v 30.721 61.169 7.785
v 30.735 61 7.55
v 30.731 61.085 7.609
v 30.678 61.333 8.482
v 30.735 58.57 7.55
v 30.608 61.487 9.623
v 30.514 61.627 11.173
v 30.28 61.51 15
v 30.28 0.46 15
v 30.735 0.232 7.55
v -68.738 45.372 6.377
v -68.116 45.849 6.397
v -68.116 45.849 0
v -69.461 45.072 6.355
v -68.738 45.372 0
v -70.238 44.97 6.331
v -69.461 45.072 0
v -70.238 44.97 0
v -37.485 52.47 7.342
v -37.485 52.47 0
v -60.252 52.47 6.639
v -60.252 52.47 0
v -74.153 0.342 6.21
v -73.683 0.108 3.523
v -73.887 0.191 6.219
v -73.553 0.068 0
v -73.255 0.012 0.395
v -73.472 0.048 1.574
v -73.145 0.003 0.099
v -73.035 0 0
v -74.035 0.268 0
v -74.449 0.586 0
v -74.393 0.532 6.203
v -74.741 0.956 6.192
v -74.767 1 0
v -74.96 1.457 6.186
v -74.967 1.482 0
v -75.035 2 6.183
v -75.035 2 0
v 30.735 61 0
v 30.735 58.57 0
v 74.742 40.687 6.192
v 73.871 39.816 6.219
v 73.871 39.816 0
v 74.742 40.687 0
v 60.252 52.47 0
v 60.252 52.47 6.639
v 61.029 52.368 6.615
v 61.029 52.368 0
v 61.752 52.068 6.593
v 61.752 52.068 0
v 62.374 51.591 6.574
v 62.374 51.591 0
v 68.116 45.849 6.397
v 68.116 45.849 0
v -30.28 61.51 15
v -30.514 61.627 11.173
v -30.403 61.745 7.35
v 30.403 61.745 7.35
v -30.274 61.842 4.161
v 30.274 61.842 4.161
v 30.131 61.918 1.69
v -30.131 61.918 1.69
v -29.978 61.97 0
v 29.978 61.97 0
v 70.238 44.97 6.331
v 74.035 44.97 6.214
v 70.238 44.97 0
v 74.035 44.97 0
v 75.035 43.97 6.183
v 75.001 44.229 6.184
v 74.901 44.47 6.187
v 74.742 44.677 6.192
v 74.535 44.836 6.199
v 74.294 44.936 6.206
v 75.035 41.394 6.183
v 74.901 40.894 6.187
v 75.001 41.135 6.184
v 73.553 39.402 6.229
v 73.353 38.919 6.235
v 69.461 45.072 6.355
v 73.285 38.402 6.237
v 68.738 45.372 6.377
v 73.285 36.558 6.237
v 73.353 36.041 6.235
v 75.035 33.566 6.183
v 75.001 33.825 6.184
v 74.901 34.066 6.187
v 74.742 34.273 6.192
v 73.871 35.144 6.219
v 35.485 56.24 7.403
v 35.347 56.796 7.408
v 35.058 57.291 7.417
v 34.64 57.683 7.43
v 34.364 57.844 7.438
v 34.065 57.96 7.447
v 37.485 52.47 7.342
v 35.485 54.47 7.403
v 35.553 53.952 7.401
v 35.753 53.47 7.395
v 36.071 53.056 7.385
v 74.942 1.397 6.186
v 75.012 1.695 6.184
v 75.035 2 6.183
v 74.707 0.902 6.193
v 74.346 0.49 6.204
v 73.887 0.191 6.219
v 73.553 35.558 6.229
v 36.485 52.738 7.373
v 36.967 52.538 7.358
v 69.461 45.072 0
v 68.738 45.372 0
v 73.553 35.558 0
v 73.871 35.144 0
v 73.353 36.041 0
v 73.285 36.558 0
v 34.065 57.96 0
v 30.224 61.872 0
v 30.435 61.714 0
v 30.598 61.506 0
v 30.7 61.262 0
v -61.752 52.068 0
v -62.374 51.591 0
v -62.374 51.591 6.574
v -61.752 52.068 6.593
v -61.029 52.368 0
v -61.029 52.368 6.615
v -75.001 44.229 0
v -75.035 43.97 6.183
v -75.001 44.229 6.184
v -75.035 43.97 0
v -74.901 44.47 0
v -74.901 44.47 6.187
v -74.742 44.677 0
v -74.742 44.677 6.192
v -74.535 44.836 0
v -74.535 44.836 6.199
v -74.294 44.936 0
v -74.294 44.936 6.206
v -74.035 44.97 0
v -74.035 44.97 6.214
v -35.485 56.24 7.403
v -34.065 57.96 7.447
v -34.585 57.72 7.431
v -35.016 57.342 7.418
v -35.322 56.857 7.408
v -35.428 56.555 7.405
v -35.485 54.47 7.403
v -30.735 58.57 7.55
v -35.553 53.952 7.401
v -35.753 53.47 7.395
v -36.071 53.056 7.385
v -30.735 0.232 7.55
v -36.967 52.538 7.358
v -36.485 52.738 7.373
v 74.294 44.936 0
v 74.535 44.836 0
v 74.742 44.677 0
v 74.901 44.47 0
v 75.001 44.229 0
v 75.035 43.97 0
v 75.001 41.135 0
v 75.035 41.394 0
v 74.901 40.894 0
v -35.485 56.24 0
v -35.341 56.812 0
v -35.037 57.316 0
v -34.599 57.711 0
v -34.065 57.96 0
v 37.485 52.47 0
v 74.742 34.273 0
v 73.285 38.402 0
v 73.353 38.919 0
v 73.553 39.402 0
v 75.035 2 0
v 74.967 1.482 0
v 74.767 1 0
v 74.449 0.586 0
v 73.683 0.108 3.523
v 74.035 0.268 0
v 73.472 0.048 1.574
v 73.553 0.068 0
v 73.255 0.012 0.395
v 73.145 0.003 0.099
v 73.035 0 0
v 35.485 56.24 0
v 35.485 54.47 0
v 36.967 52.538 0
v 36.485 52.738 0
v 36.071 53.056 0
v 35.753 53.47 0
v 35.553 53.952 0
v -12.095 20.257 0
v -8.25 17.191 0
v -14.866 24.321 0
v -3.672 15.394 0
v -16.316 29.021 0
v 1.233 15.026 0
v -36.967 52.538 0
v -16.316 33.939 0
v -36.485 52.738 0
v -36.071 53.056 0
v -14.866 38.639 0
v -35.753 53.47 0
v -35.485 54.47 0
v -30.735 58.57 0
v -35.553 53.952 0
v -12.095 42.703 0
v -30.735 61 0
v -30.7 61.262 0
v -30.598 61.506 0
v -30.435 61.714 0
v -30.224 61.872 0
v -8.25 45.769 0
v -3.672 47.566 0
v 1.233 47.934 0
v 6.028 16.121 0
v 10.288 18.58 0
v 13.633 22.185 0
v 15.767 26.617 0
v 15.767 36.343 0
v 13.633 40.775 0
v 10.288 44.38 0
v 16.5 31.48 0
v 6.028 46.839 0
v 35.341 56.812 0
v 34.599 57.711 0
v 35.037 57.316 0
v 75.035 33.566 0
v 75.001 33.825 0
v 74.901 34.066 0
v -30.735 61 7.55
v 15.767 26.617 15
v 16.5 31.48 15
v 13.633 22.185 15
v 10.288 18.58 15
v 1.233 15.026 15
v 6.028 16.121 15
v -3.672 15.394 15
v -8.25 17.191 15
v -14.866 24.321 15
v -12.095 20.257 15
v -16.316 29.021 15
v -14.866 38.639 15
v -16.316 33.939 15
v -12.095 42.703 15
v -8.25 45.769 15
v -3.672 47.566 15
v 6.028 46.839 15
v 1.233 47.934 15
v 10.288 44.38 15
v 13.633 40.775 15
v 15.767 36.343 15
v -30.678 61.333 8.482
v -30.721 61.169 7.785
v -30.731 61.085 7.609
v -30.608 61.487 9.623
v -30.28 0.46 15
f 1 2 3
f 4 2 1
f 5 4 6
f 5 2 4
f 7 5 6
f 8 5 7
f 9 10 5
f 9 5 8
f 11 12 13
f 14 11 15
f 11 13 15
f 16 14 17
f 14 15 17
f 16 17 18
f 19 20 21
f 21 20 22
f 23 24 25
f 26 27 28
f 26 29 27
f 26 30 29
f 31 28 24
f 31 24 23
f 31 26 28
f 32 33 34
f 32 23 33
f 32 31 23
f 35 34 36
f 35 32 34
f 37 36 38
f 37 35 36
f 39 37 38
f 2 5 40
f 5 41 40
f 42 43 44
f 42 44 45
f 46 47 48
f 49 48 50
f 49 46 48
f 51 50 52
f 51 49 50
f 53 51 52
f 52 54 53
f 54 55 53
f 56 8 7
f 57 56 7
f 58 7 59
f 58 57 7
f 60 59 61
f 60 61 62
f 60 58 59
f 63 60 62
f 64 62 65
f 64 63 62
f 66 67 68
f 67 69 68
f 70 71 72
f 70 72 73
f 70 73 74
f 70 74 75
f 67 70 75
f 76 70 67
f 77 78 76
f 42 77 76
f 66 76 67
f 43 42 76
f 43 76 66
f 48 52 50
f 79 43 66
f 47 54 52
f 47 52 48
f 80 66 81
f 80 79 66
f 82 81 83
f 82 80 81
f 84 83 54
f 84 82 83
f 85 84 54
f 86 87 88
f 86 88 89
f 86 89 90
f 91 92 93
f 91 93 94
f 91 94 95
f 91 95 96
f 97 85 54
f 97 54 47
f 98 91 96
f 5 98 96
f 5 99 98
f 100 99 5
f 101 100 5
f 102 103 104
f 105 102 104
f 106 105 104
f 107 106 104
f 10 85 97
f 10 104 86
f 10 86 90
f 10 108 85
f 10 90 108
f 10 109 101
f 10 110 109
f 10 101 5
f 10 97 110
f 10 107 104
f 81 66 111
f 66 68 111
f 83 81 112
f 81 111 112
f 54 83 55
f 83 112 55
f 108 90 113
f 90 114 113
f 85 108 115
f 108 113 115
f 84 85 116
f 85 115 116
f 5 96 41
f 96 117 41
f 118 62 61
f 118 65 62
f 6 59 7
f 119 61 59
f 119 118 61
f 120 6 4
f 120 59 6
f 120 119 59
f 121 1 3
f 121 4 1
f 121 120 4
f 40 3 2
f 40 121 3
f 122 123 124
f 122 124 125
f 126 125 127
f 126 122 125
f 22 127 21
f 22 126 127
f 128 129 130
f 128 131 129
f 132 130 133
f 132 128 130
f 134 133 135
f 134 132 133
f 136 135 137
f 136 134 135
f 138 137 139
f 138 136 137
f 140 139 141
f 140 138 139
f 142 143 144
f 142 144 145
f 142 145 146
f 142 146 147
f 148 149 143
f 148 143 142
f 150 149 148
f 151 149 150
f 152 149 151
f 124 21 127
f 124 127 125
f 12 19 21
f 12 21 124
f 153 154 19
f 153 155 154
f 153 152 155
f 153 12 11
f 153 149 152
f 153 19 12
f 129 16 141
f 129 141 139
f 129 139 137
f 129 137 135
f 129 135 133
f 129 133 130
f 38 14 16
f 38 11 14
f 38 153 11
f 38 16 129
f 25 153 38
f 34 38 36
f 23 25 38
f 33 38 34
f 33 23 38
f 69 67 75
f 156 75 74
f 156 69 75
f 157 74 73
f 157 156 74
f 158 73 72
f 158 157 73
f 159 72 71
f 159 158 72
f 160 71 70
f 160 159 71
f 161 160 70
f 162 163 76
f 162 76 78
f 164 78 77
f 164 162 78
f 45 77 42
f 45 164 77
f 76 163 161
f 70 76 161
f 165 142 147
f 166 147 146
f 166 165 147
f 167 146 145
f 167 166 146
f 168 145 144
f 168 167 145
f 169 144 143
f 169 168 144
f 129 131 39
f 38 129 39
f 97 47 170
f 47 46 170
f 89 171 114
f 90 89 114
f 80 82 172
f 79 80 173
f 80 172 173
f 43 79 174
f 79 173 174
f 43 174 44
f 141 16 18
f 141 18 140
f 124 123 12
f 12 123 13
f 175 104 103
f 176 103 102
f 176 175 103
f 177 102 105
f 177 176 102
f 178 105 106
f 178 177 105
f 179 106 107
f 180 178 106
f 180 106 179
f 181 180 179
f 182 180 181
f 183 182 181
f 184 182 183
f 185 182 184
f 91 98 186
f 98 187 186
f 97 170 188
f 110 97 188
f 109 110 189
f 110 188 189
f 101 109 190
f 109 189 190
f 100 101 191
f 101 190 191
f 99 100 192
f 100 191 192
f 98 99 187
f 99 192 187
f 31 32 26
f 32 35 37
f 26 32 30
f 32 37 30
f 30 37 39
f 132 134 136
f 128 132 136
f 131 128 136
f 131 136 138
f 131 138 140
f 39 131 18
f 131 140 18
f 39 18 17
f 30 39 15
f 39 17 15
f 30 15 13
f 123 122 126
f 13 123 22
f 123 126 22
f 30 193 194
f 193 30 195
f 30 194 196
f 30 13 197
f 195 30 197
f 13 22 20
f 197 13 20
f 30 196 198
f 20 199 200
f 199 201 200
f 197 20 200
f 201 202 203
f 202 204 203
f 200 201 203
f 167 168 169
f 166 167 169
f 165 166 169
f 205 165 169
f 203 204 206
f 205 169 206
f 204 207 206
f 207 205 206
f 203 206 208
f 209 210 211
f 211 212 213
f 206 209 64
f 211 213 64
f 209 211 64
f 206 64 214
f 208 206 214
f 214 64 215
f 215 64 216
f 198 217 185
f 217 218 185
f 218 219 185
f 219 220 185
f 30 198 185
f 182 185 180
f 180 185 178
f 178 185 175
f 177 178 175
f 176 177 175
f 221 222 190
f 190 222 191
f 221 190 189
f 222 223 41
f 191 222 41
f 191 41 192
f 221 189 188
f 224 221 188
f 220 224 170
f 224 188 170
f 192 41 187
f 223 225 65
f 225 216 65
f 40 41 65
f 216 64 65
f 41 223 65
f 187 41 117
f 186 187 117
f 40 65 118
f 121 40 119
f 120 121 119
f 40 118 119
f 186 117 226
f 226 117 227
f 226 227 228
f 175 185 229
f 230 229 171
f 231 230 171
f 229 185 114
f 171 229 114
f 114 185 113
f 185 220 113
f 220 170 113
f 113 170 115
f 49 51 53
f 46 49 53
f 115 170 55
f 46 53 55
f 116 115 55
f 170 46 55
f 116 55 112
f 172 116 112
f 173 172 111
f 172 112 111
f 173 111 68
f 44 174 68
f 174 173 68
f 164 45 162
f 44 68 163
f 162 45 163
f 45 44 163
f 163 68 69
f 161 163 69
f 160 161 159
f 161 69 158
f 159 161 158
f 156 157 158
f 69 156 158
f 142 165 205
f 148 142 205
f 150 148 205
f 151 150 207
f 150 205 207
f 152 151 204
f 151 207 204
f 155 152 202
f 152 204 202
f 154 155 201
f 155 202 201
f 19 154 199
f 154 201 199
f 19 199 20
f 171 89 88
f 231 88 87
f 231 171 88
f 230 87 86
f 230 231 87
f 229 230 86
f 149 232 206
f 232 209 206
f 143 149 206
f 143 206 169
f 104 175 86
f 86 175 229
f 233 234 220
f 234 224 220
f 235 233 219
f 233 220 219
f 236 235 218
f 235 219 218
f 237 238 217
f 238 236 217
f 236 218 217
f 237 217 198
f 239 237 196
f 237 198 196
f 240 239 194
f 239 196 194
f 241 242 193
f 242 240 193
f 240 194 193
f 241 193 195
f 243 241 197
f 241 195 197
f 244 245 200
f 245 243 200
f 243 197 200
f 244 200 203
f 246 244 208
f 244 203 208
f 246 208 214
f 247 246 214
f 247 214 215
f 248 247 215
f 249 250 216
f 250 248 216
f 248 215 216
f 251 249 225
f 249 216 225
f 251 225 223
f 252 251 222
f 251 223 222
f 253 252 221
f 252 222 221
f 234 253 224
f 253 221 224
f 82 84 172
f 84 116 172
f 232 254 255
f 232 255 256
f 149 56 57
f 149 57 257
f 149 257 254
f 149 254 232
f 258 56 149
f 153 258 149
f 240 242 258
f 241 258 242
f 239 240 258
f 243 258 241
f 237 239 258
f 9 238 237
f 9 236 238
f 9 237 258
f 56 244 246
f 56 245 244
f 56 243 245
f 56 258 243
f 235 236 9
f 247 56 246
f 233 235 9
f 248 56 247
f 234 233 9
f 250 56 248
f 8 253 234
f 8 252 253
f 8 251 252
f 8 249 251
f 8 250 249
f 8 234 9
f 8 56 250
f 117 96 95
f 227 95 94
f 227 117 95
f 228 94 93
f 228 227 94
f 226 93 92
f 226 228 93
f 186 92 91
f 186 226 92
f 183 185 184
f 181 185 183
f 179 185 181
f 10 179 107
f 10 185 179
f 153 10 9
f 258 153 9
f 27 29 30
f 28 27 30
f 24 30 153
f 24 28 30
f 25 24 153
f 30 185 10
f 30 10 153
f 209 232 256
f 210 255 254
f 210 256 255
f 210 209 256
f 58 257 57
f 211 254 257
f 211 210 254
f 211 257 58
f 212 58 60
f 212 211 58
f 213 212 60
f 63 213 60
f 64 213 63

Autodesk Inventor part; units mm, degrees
sketch "__1" plane through (0, 0, 0) normal (0, 0, 1) x (1, 0, 0)
  line L0 (-75.035, 43.97) -> (-75.035, 2)
  arc A0 (-75.035, 2) -> (-73.035, 0) centre (-73.035, 2) ccw
  line L1 (-73.035, 0) -> (73.035, 0)
  arc A1 (73.035, 0) -> (75.035, 2) centre (73.035, 2) ccw
  line L2 (75.035, 2) -> (75.035, 33.5658)
  arc A2 (75.035, 33.5658) -> (74.7421, 34.2729) centre (74.035, 33.5658) ccw
  line L3 (74.7421, 34.2729) -> (73.8708, 35.1442)
  arc A3 (73.285, 36.5584) -> (73.8708, 35.1442) centre (75.285, 36.5584) ccw
  line L4 (73.285, 36.5584) -> (73.285, 38.4016)
  arc A4 (73.8708, 39.8158) -> (73.285, 38.4016) centre (75.285, 38.4016) ccw
  line L5 (73.8708, 39.8158) -> (74.7421, 40.6871)
  arc A5 (74.7421, 40.6871) -> (75.035, 41.3942) centre (74.035, 41.3942) ccw
  line L6 (75.035, 41.3942) -> (75.035, 43.97)
  arc A6 (75.035, 43.97) -> (74.035, 44.97) centre (74.035, 43.97) ccw
  line L7 (74.035, 44.97) -> (70.2376, 44.97)
  arc A7 (68.1163, 45.8487) -> (70.2376, 44.97) centre (70.2376, 47.97) ccw
  line L8 (68.1163, 45.8487) -> (62.3737, 51.5913)
  arc A8 (62.3737, 51.5913) -> (60.2524, 52.47) centre (60.2524, 49.47) ccw
  line L9 (60.2524, 52.47) -> (37.485, 52.47)
  arc A9 (35.485, 54.47) -> (37.485, 52.47) centre (37.485, 54.47) ccw
  line L10 (35.485, 54.47) -> (35.485, 56.24)
  arc A10 (35.485, 56.24) -> (34.065, 57.96) centre (33.4947, 56.043) ccw
  line L11 (34.065, 57.96) -> (30.735, 58.57)
  line L12 (30.735, 58.57) -> (30.735, 61)
  arc A11 (30.735, 61) -> (29.735, 62) centre (29.735, 61) ccw
  line L13 (29.735, 62) -> (-29.735, 62)
  arc A12 (-29.735, 62) -> (-30.735, 61) centre (-29.735, 61) ccw
  line L14 (-30.735, 61) -> (-30.735, 58.57)
  line L15 (-30.735, 58.57) -> (-34.065, 57.96)
  arc A13 (-34.065, 57.96) -> (-35.485, 56.24) centre (-33.4947, 56.043) ccw
  line L16 (-35.485, 56.24) -> (-35.485, 54.47)
  arc A14 (-37.485, 52.47) -> (-35.485, 54.47) centre (-37.485, 54.47) ccw
  line L17 (-37.485, 52.47) -> (-60.2524, 52.47)
  arc A15 (-60.2524, 52.47) -> (-62.3737, 51.5913) centre (-60.2524, 49.47) ccw
  line L18 (-62.3737, 51.5913) -> (-68.1163, 45.8487)
  arc A16 (-70.2376, 44.97) -> (-68.1163, 45.8487) centre (-70.2376, 47.97) ccw
  line L19 (-70.2376, 44.97) -> (-74.035, 44.97)
  arc A17 (-74.035, 44.97) -> (-75.035, 43.97) centre (-74.035, 43.97) ccw
  circle A18 centre (0, 31.48) radius 16.5
extrude "Extrusion1" add sketch "__1" along normal blind 15
sketch "__3" plane through (0, 0, 0) normal (0, 1, 0) x (-1, 0, 0)
  line L0 (80, 6.03) -> (80, 18)
  line L1 (80, 18) -> (-80, 18)
  line L2 (-80, 18) -> (-80, 6.03)
  line L3 (-80, 6.03) -> (-30.735, 7.55)
  line L4 (-30.735, 7.55) -> (-30.28, 15)
  line L5 (-30.28, 15) -> (30.28, 15)
  line L6 (30.28, 15) -> (30.735, 7.55)
  line L7 (30.735, 7.55) -> (80, 6.03)
extrude "Extrusion2" cut sketch "__3" along normal blind 61.97
sketch "__4" plane through (0, 0, 0) normal (1, 0, 0) x (0, 1, 0)
  line L0 (63.944, 20) -> (0, 20)
  line L1 (0, 20) -> (0, 0)
  line L2 (0, 0) -> (0.46, 15)
  line L3 (0.46, 15) -> (61.51, 15)
  line L4 (61.51, 15) -> (61.97, 0)
  line L5 (61.97, 0) -> (63.944, 0)
  line L6 (63.944, 0) -> (63.944, 20)
extrude "Extrusion3" cut sketch "__4" along normal mid plane 150.07
ref_plane "BODY5_XY" through (0, 0, 0) normal (0, 0, 1) x (1, 0, 0)
ref_plane "BODY5_YZ" through (0, 0, 0) normal (1, 0, 0) x (0, 1, 0)
ref_plane "BODY5_ZX" through (0, 0, 0) normal (0, 1, 0) x (0, 0, 1)
ref_plane "MD1_XY" through (0, 31.48, 15) normal (0, 0, -1) x (1, 0, 0)
ref_plane "MD1_YZ" through (0, 31.48, 15) normal (1, 0, 0) x (0, -1, 0)
ref_plane "MD1_ZX" through (0, 31.48, 15) normal (0, -1, 0) x (0, 0, -1)
properties part number "ETH2-17-BC-L_5"
